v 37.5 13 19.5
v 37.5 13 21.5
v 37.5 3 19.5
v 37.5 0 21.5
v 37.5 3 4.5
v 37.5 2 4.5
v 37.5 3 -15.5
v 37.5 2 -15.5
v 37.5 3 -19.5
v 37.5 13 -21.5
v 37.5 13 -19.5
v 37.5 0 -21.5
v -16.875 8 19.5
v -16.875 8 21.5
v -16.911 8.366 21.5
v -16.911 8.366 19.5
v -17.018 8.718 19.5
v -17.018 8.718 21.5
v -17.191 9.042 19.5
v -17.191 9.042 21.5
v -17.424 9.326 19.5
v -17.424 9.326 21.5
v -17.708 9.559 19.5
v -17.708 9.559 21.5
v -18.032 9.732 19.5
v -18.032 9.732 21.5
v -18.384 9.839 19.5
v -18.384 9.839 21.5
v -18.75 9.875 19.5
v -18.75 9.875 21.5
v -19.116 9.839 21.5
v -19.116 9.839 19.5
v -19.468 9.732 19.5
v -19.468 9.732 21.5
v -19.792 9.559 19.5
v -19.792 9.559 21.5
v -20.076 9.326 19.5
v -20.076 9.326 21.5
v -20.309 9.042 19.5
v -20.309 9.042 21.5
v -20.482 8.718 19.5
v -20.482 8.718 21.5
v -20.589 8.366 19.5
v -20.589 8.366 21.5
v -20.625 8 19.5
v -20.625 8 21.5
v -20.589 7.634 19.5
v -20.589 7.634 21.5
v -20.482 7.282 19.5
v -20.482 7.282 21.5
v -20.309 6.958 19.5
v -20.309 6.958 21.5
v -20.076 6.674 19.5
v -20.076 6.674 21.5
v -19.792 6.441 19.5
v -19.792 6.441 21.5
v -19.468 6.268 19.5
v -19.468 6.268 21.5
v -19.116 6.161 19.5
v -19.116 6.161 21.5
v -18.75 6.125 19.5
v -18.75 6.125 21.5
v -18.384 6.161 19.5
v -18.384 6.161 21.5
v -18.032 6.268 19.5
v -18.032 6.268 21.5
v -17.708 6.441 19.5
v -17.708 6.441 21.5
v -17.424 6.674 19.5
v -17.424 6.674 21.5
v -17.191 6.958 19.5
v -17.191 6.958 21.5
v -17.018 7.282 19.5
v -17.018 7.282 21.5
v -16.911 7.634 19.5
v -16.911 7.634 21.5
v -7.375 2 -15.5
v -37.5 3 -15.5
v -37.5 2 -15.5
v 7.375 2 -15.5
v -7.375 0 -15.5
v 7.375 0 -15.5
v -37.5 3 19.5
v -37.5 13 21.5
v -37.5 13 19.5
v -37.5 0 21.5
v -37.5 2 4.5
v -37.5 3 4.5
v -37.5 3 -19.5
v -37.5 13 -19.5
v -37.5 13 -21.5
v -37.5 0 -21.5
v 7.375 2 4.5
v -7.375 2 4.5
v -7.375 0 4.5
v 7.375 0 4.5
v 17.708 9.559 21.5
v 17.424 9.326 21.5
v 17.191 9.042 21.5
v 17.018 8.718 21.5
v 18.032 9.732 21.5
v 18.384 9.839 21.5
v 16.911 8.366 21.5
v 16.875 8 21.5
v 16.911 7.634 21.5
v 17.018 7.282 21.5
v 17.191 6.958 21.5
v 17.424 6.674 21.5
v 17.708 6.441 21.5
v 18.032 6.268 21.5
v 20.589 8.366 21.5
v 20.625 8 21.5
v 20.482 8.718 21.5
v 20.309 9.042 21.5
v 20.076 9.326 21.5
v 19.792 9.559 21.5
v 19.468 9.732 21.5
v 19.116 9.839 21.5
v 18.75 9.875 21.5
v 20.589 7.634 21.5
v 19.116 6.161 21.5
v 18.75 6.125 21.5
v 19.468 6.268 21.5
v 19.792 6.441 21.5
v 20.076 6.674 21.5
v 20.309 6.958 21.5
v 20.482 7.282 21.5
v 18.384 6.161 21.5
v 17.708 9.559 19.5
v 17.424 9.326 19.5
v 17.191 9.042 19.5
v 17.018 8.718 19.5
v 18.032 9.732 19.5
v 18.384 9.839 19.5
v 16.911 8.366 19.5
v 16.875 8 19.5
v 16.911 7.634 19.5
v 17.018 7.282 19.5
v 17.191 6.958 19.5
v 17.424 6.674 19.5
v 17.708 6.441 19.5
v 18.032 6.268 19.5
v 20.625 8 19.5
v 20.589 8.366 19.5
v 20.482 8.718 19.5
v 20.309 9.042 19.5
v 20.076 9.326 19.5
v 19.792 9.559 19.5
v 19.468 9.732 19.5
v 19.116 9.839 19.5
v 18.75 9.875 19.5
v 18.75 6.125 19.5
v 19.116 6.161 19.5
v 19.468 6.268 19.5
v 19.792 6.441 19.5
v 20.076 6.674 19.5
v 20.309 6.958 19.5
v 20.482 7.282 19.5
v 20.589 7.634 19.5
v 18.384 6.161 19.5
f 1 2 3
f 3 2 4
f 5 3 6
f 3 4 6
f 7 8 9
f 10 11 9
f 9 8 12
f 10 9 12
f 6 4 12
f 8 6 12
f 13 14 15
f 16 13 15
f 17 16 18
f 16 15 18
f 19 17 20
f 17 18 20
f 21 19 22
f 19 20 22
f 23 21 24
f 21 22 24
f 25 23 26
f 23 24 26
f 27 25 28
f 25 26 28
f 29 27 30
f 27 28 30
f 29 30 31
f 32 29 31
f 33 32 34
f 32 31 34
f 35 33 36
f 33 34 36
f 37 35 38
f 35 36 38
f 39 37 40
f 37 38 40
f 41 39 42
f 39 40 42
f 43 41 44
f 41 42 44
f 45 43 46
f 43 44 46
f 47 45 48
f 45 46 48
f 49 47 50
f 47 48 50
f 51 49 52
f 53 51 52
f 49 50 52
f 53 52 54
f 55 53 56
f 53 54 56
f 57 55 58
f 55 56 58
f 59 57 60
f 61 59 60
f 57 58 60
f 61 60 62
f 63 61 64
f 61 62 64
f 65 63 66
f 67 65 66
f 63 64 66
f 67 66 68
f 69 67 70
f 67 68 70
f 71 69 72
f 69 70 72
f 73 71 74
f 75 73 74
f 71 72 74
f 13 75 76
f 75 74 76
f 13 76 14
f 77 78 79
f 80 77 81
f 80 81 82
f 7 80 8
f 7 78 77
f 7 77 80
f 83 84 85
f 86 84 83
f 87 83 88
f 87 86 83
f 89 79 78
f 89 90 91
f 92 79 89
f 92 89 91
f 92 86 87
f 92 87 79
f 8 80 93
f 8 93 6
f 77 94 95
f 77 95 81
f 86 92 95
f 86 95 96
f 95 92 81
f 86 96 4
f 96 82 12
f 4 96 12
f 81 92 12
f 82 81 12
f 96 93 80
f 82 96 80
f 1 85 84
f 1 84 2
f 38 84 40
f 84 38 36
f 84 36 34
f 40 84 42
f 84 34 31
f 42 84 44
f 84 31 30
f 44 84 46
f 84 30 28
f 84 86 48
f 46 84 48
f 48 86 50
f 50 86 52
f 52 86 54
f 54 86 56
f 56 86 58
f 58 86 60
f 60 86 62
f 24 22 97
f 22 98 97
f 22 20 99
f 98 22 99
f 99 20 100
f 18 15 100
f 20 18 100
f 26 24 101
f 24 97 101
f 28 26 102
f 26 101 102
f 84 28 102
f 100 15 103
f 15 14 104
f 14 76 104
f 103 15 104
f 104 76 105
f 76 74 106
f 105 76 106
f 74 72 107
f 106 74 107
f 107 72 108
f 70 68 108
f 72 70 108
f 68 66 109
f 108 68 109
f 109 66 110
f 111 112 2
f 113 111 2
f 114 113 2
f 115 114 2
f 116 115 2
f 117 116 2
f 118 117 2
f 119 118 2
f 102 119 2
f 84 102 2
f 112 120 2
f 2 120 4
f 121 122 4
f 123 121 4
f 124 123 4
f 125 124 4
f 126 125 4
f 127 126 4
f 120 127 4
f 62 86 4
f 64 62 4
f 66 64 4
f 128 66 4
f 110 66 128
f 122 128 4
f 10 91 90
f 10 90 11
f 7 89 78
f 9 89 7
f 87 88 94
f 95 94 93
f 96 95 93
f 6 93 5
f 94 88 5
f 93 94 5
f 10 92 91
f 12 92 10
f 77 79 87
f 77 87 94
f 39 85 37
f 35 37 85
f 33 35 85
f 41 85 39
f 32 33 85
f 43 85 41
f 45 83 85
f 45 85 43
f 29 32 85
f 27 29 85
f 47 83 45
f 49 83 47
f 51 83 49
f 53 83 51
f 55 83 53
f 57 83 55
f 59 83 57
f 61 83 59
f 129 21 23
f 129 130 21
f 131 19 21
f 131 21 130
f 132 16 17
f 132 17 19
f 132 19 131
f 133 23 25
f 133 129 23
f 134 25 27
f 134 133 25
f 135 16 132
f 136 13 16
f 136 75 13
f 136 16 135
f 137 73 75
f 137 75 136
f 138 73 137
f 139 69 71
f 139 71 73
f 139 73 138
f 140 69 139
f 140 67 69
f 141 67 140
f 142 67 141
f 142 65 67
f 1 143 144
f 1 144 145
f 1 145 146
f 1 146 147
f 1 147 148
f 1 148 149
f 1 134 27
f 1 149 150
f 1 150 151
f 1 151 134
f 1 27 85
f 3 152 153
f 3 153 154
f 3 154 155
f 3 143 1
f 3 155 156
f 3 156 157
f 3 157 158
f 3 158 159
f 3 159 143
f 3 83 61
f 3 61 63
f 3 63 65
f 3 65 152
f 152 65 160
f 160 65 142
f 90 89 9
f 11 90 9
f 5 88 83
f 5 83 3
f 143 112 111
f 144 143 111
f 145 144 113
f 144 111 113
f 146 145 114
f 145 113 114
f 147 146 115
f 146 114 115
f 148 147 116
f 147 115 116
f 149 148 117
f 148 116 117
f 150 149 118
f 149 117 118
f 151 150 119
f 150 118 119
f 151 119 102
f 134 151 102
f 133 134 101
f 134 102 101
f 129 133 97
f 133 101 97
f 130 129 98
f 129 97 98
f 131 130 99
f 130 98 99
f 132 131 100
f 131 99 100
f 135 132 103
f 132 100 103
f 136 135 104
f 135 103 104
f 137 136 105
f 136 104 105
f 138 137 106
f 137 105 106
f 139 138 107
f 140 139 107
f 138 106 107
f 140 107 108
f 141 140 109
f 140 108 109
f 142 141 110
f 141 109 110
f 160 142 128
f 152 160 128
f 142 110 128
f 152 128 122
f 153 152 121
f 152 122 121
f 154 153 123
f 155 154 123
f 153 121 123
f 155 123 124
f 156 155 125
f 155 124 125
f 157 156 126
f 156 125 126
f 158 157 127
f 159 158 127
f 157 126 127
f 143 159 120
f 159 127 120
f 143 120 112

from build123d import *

# Parameters (mm, degrees)
SKETCH1_W           = 75
SKETCH1_H           = 43
BOSS_EXTRUDE1_DEPTH = 3
SKETCH2_W           = 75
SKETCH2_H           = 2
BOSS_EXTRUDE2_DEPTH = 10
SKETCH3_W           = 75
SKETCH3_H           = 2
BOSS_EXTRUDE3_DEPTH = 10
SKETCH4_OUTSIDE_W   = 94.484
SKETCH4_OUTSIDE_H   = 32.484
SKETCH4_OUTSIDE_W_2 = 79
SKETCH4_OUTSIDE_H_2 = 17
SKETCH4_OUTSIDE_R   = 1.875
CUT_EXTRUDE2_DEPTH  = 2
SKETCH6_W           = 14.75
SKETCH6_H           = 20
CUT_EXTRUDE3_DEPTH  = 45.367781103
SKETCH7_W           = 75
SKETCH7_H           = 20
CUT_EXTRUDE4_DEPTH  = 1


with BuildPart() as part:
    # Sketch1 → Boss-Extrude1 (new body)
    with BuildSketch(Plane(origin=(0, 0, 0), x_dir=(1, 0, 0), z_dir=(0, 1, 0))):
        Rectangle(SKETCH1_W, SKETCH1_H)
    extrude(amount=BOSS_EXTRUDE1_DEPTH)

    # Sketch2 → Boss-Extrude2 (add)
    with BuildSketch(Plane(origin=(0, 3, 0), x_dir=(1, 0, 0), z_dir=(0, 1, 0))):
        with Locations((0, 20.5)):
            Rectangle(SKETCH2_W, SKETCH2_H)
    extrude(amount=BOSS_EXTRUDE2_DEPTH)

    # Sketch3 → Boss-Extrude3 (add)
    with BuildSketch(Plane(origin=(0, 3, 0), x_dir=(1, 0, 0), z_dir=(0, 1, 0))):
        with Locations((0, -20.5)):
            Rectangle(SKETCH3_W, SKETCH3_H)
    extrude(amount=BOSS_EXTRUDE3_DEPTH)

    # Sketch4 outside → Cut-Extrude2 (cut)
    # profile 1 of 3: a face of its own
    with BuildSketch(Plane.XY.offset(21.5)):
        with Locations((0, 6.5)):
            Rectangle(SKETCH4_OUTSIDE_W, SKETCH4_OUTSIDE_H)
        with Locations((0, 6.5)):
            Rectangle(SKETCH4_OUTSIDE_W_2, SKETCH4_OUTSIDE_H_2, mode=Mode.SUBTRACT)
    # profile 2 of 3: a face of its own
    with BuildSketch(Plane.XY.offset(21.5)):
        with Locations((18.75, 8)):
            Circle(SKETCH4_OUTSIDE_R)
    # profile 3 of 3: a face of its own
    with BuildSketch(Plane.XY.offset(21.5)):
        with Locations((-18.75, 8)):
            Circle(SKETCH4_OUTSIDE_R)
    extrude(amount=-CUT_EXTRUDE2_DEPTH, mode=Mode.SUBTRACT)

    # Sketch6 → Cut-Extrude3 (cut, through all)
    with BuildSketch(Plane(origin=(0, 3, 0), x_dir=(1, 0, 0), z_dir=(0, 1, 0))):
        with Locations((0, 5.5)):
            Rectangle(SKETCH6_W, SKETCH6_H)
    extrude(amount=-CUT_EXTRUDE3_DEPTH, mode=Mode.SUBTRACT)

    # Sketch7 → Cut-Extrude4 (cut)
    with BuildSketch(Plane(origin=(0, 3, 0), x_dir=(1, 0, 0), z_dir=(0, 1, 0))):
        with Locations((0, 5.5)):
            Rectangle(SKETCH7_W, SKETCH7_H)
    extrude(amount=-CUT_EXTRUDE4_DEPTH, mode=Mode.SUBTRACT)


solid = part.part
